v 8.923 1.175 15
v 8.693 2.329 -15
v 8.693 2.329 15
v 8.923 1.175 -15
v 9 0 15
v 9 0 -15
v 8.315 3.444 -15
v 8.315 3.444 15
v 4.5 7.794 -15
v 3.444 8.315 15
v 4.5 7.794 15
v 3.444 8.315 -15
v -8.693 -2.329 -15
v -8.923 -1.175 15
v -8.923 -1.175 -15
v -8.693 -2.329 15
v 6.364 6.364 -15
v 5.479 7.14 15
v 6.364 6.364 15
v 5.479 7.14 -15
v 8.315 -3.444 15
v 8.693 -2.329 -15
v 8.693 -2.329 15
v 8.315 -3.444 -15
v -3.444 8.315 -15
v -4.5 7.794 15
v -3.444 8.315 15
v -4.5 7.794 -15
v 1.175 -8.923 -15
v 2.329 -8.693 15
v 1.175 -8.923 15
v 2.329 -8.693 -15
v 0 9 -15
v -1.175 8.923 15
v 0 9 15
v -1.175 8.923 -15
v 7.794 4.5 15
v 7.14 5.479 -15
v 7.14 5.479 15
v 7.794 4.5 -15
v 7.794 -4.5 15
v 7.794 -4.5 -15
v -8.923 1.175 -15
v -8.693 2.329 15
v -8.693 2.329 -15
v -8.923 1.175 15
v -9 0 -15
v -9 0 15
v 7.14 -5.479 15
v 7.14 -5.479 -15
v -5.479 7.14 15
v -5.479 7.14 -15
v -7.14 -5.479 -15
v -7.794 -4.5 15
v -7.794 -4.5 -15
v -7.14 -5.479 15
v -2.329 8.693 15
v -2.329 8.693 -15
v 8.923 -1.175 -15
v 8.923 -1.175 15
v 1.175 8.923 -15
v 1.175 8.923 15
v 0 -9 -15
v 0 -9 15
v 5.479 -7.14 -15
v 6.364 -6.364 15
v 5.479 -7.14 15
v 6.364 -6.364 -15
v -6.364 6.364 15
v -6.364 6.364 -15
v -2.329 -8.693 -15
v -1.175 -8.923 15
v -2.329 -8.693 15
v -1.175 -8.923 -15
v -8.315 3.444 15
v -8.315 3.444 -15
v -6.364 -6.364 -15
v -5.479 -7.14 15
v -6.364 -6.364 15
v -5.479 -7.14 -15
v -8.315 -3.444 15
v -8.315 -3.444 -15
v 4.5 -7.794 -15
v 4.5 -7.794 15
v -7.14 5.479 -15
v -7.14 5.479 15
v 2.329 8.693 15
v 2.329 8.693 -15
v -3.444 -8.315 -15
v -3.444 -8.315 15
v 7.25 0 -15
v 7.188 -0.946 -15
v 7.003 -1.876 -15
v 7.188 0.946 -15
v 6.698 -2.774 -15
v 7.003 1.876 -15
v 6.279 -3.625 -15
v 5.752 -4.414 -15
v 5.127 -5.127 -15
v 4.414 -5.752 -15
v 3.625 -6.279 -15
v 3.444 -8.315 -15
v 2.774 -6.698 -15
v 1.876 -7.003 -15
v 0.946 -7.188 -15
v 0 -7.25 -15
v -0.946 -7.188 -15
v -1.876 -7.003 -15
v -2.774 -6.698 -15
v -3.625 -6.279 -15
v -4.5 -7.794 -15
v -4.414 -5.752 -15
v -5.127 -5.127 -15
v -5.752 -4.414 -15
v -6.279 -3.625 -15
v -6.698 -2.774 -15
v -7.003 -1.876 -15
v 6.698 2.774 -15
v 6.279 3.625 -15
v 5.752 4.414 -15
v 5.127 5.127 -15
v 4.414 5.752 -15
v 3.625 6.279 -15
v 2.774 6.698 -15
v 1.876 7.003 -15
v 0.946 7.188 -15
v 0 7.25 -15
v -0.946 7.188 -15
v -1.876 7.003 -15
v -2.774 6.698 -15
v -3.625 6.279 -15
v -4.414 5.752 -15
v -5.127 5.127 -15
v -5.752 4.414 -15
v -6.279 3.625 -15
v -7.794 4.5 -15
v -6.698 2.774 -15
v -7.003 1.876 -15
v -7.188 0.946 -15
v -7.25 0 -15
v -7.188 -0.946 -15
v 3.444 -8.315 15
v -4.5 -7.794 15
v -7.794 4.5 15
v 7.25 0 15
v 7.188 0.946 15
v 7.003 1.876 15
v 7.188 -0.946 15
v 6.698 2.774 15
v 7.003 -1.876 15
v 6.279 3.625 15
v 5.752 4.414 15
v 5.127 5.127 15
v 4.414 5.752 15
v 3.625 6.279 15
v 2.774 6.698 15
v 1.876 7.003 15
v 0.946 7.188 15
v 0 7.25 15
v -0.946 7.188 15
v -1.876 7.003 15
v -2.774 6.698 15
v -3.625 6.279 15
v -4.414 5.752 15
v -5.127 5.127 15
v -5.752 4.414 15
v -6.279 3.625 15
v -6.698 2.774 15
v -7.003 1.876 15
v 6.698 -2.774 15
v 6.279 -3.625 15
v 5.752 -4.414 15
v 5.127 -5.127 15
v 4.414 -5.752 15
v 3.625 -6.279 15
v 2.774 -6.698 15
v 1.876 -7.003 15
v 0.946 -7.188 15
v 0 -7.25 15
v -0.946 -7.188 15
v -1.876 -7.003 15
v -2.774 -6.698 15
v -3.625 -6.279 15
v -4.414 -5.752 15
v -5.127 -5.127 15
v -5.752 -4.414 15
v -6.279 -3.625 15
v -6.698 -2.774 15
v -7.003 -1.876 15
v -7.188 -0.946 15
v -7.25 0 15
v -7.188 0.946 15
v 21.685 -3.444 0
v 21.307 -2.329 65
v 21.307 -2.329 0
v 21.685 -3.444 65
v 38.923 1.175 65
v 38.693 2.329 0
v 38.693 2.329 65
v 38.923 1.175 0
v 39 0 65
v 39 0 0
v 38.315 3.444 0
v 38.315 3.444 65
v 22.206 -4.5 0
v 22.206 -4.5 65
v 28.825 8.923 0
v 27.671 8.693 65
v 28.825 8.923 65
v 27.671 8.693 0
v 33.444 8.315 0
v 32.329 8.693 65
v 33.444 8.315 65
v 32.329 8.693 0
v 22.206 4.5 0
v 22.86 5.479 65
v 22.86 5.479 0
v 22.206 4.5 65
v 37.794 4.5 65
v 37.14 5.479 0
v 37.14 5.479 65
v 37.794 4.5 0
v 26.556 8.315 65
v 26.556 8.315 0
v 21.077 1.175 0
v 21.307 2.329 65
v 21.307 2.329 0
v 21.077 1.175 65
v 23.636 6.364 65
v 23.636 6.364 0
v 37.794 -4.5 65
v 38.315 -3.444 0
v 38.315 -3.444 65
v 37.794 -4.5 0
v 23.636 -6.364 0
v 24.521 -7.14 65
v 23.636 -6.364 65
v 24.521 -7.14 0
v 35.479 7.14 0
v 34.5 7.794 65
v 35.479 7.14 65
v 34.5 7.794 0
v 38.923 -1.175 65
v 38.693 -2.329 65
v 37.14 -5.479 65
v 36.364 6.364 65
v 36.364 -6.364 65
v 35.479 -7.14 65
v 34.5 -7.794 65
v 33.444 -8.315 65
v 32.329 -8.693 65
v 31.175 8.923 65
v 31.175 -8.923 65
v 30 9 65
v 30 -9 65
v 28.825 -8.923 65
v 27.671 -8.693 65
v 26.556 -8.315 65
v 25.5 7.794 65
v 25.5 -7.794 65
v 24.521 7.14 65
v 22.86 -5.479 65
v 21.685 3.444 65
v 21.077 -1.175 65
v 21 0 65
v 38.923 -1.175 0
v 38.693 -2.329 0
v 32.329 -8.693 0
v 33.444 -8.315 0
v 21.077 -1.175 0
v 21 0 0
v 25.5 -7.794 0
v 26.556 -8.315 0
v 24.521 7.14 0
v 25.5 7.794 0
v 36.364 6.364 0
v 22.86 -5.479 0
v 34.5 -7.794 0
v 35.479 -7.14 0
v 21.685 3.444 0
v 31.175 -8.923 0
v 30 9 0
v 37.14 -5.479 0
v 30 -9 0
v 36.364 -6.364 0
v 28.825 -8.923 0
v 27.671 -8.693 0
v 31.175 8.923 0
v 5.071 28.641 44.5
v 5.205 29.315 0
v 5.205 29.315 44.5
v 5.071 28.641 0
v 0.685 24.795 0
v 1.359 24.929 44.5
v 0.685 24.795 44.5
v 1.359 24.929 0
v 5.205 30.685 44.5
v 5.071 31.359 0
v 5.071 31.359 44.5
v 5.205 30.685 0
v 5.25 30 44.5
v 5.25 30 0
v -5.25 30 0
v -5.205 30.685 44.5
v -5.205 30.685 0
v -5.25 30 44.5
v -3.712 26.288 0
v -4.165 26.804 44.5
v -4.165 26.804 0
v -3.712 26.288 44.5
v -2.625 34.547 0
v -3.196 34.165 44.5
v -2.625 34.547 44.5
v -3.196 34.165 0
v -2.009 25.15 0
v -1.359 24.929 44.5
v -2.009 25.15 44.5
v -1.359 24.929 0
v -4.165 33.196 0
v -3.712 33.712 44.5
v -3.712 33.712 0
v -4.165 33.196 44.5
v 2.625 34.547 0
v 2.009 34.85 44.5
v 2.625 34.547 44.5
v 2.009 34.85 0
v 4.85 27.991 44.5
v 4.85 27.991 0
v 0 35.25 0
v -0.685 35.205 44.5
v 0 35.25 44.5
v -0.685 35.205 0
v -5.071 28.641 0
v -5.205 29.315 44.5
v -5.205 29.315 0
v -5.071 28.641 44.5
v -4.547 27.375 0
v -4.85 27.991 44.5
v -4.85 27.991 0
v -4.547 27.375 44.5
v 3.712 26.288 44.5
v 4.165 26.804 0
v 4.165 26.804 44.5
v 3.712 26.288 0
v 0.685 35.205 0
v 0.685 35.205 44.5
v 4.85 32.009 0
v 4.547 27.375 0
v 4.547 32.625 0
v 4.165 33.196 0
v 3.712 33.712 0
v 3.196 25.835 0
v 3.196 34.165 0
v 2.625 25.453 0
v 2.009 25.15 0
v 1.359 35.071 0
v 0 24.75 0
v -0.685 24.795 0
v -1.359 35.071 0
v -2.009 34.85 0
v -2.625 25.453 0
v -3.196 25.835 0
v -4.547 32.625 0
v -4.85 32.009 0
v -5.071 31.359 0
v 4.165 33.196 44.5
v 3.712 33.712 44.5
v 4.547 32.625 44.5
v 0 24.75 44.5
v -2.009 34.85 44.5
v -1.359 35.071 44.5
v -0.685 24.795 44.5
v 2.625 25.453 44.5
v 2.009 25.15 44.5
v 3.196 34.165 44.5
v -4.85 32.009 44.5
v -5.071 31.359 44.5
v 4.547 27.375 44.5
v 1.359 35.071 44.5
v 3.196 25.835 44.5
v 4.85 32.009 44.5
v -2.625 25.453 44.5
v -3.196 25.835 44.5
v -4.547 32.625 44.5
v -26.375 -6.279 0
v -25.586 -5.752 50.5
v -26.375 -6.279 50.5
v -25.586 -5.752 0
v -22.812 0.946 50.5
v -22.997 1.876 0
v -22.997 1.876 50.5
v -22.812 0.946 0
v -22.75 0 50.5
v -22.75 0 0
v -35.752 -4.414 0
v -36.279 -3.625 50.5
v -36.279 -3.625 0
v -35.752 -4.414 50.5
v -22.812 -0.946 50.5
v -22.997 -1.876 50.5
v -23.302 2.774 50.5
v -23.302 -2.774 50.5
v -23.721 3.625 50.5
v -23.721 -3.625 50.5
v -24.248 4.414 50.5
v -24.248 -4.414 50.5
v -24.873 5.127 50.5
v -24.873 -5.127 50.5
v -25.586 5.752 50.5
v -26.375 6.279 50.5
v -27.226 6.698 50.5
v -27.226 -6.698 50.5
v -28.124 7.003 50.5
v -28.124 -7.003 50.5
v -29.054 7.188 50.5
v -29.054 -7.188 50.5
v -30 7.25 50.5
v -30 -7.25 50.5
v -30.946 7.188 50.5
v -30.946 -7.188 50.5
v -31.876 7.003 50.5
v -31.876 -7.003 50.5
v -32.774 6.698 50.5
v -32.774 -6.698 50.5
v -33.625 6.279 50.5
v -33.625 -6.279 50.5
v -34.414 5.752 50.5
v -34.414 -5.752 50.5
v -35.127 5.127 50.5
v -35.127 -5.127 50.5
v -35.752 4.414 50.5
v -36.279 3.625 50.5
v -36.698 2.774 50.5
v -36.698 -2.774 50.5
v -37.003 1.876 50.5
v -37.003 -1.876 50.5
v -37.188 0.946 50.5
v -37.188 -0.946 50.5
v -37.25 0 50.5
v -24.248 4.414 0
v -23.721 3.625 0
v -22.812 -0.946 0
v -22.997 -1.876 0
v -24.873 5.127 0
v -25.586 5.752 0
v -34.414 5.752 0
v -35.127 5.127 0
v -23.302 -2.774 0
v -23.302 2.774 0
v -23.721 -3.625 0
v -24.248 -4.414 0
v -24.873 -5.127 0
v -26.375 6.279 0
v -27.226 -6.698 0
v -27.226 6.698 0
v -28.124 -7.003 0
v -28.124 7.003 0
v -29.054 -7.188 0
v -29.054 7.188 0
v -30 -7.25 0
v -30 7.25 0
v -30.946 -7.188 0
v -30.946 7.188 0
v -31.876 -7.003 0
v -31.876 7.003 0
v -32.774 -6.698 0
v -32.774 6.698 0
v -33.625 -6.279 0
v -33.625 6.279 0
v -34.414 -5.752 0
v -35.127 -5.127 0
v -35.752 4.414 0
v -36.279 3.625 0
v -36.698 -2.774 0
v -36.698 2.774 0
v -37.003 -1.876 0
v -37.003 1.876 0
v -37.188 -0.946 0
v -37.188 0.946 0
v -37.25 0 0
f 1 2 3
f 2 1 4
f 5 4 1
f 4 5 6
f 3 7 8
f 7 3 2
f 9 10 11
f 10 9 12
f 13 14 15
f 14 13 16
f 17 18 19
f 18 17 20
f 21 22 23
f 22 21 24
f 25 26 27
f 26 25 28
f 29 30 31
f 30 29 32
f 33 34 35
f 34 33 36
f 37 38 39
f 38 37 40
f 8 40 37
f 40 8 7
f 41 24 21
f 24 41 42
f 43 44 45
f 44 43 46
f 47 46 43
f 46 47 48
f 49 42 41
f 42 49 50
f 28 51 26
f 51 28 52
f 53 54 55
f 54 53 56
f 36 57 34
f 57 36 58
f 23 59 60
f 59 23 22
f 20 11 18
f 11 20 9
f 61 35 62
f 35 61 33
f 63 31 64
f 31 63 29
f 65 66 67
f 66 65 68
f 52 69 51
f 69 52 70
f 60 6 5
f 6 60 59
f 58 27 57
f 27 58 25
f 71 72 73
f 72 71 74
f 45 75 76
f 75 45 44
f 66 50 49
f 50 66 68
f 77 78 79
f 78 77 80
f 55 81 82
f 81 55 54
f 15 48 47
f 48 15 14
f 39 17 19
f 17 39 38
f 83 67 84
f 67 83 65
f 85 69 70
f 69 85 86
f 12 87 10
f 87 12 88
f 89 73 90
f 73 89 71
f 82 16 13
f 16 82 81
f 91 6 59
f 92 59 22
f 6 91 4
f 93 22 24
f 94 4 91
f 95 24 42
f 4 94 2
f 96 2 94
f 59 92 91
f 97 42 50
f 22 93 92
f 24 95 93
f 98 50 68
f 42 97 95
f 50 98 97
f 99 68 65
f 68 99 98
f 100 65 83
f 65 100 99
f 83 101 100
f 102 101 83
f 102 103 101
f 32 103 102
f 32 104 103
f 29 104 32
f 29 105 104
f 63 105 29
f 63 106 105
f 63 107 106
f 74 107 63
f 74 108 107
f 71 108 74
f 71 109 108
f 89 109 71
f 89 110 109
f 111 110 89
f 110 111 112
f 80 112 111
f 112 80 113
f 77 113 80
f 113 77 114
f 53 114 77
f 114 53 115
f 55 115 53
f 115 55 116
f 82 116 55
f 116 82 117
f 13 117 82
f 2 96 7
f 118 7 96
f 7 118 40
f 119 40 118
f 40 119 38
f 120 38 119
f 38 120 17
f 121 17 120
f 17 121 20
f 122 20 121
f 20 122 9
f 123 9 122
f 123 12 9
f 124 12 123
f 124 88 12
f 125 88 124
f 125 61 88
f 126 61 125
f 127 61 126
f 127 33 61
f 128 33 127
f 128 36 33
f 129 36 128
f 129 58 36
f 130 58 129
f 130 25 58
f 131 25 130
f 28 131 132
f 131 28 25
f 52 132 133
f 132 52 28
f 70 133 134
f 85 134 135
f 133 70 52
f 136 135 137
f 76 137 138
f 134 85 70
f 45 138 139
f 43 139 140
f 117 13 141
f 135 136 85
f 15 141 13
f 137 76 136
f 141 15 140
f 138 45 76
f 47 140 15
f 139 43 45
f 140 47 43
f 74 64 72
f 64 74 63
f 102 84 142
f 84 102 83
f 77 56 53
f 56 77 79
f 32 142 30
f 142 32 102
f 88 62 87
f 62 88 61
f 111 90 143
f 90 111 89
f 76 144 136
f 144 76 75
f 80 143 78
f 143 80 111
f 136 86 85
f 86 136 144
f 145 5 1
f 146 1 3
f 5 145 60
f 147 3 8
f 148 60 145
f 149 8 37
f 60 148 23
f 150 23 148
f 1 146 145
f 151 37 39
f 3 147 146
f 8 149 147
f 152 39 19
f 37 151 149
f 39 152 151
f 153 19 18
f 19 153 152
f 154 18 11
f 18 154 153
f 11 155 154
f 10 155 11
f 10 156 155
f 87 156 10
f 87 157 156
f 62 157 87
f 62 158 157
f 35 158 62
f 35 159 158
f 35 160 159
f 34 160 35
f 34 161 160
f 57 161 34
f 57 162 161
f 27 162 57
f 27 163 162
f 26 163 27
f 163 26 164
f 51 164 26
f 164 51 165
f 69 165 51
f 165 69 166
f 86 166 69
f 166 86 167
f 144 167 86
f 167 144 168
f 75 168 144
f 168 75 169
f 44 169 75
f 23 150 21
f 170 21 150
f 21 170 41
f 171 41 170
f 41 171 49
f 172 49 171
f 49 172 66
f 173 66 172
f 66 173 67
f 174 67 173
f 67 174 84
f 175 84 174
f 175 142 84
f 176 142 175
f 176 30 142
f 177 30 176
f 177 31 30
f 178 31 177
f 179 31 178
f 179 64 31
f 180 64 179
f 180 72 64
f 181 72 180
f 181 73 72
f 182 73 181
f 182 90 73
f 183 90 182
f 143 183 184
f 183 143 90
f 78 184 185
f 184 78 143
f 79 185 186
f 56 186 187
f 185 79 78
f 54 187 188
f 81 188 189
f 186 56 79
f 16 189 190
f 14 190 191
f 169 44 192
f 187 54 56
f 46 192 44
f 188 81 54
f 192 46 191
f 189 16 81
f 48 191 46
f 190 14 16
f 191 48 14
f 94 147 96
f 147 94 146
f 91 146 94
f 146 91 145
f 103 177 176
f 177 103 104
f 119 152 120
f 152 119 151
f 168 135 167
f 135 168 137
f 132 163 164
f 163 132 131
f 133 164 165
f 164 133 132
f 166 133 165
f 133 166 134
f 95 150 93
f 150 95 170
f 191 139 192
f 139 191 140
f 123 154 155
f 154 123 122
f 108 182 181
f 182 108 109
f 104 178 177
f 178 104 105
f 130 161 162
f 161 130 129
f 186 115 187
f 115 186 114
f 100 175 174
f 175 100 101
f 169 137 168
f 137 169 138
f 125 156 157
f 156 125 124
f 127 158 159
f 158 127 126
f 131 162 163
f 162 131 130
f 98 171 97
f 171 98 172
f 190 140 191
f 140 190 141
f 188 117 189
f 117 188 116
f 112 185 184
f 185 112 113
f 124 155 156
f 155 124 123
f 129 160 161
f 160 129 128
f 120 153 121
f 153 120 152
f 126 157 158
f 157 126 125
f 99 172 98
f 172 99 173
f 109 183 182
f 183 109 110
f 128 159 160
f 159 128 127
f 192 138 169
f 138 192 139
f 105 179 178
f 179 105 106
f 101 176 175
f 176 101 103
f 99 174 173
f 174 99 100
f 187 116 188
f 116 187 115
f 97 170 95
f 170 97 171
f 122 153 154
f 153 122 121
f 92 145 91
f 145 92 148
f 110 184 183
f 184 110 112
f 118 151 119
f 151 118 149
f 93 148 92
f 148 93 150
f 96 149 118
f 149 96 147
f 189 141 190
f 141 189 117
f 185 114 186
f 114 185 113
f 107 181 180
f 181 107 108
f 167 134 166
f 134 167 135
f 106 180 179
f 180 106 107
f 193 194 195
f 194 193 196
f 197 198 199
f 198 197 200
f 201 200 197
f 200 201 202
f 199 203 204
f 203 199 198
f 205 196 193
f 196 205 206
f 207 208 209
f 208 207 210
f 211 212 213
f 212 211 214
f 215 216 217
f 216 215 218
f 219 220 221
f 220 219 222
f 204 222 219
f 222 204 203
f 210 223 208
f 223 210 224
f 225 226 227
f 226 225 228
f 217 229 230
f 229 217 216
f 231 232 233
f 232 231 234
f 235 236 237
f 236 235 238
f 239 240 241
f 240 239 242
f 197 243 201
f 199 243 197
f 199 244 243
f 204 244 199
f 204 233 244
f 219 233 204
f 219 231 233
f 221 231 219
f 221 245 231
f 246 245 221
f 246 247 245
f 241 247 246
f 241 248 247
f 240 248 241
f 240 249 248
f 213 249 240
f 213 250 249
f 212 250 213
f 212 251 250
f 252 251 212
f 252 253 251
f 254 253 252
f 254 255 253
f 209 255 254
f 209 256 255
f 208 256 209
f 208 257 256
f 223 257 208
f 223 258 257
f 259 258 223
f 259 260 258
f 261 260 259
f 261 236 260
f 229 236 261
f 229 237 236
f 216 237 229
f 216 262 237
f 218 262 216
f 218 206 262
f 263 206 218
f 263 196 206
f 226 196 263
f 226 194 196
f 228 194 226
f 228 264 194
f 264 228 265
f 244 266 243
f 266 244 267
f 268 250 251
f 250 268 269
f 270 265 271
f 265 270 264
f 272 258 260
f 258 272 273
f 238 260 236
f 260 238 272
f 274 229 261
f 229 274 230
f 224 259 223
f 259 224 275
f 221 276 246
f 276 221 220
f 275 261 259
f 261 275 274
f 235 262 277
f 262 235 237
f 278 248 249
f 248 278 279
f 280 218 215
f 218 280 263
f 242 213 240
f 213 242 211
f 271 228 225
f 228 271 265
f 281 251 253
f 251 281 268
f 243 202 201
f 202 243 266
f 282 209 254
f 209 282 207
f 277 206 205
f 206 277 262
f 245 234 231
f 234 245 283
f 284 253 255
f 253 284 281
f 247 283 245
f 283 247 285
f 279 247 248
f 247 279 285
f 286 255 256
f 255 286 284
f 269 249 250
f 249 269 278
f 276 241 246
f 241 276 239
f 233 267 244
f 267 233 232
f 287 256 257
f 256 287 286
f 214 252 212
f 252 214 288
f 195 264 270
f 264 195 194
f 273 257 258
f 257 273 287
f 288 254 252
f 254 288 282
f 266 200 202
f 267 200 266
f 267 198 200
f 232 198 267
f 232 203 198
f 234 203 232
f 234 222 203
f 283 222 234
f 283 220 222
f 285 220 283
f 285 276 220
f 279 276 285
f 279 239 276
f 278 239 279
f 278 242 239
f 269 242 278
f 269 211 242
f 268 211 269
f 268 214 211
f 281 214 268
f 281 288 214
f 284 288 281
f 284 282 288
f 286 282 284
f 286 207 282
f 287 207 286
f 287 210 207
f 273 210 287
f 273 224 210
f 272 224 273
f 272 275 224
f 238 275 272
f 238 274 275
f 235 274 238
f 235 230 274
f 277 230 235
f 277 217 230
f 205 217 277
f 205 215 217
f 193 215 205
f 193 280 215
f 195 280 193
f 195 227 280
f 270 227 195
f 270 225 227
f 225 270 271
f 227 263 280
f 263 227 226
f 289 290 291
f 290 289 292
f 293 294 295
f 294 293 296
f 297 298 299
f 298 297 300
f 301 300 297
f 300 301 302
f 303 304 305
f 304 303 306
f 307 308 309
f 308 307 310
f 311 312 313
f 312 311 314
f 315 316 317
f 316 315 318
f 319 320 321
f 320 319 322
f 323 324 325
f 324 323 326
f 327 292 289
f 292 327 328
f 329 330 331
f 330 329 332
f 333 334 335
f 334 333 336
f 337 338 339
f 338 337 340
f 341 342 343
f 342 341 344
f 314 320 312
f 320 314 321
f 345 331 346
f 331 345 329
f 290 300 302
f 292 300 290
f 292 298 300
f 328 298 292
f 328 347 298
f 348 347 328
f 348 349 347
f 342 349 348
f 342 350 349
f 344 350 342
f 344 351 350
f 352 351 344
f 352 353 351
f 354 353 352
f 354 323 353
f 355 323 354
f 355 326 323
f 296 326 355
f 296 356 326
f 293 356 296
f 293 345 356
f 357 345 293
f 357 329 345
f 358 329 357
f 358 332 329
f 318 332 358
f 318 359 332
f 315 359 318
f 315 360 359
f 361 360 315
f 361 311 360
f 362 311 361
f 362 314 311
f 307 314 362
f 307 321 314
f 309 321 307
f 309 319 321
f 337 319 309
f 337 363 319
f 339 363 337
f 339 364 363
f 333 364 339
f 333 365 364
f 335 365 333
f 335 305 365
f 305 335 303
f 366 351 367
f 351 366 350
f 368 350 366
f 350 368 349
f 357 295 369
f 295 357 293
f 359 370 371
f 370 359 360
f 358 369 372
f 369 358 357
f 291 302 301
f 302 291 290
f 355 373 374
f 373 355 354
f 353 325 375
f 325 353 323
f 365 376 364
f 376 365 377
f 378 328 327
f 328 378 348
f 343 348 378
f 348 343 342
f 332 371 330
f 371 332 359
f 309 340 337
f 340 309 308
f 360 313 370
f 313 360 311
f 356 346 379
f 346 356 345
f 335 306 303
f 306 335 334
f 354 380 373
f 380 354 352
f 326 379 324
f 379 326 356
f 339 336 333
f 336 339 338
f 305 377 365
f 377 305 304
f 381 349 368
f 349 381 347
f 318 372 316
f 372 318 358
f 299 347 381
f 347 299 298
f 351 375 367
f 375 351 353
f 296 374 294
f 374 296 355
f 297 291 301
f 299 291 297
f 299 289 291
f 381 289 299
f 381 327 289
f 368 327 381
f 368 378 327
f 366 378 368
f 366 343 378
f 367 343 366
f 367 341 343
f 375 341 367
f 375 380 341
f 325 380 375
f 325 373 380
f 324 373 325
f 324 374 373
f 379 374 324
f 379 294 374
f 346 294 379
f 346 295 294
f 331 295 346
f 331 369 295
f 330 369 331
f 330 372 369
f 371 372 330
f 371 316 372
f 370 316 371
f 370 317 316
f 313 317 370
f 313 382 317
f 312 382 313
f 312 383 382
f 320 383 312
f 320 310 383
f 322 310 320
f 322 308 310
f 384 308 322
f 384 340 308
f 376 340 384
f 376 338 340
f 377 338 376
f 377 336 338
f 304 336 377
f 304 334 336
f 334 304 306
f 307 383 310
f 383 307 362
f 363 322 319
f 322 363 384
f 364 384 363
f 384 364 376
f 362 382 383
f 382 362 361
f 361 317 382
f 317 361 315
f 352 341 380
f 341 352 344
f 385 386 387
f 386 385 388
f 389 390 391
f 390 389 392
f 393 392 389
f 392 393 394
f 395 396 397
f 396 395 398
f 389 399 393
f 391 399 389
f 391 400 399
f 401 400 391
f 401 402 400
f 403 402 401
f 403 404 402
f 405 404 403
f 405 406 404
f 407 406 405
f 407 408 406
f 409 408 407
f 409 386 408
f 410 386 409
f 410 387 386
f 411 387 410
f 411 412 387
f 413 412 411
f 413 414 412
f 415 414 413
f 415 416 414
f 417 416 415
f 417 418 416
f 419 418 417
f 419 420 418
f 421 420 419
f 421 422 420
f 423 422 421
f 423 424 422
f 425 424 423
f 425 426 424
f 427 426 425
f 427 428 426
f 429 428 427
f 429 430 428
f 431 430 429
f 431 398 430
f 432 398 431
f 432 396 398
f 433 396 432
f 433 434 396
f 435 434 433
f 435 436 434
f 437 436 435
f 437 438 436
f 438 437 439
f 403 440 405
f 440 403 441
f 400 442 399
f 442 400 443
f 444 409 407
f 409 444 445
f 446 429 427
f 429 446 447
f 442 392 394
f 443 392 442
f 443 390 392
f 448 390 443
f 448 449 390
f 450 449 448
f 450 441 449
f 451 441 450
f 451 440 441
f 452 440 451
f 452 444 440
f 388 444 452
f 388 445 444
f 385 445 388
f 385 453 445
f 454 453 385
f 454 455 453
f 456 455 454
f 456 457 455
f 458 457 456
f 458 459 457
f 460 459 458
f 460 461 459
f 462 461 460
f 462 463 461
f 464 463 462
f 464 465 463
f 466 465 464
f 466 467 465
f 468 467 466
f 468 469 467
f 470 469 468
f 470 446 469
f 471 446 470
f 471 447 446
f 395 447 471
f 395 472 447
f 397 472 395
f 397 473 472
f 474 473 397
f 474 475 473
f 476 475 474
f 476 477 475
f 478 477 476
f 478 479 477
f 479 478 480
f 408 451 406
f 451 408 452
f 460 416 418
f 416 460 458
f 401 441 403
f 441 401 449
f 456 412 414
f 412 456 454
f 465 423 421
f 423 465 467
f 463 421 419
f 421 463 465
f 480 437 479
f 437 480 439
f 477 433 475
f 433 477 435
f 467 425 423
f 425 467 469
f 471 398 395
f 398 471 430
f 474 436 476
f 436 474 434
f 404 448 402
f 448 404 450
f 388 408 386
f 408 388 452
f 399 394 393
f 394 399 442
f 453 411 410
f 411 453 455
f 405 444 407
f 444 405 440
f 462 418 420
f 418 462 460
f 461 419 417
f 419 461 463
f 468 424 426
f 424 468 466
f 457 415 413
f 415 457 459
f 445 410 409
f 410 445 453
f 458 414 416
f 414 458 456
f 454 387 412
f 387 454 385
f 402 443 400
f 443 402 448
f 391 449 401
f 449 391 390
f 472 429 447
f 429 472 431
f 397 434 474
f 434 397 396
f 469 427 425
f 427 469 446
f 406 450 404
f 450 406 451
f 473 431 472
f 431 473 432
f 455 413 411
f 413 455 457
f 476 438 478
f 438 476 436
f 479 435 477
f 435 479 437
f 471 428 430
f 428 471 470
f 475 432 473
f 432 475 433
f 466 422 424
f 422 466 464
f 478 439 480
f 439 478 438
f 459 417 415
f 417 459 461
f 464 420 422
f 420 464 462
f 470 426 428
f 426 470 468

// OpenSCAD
module bat(r, h) {
	cylinder(r=r, h=h, $fn=48);
}

bat_18650_d = 18;
bat_18650_h = 65;

module bat_18650() {
	bat(r=bat_18650_d/2, h=bat_18650_h);
}

bat_aaa_d = 10.5;
bat_aaa_h = 44.5;

module bat_aaa() {
	bat(r=bat_aaa_d/2, h=bat_aaa_h);
}

bat_aa_d = 14.5;
bat_aa_h = 50.5;

module bat_aa() {
	bat(r=bat_aa_d/2, h=bat_aa_h);
}


bat_c_d = 26.2;
bat_c_h = 50;

module bat_c() {
	bat(r=bat_c_d/2, h=bat_c_h);
}

module bat_adapter() {
	difference() {
		translate([0, 0, -15])
			bat(bat_18650_d/2, 30);
		translate([0, 0, -20])
			bat(bat_aa_d/2, 40);
		# translate([0, 0, -25])
			bat(bat_aaa_d/2, 50);
	}
}

module design() {
	translate([30, 0, 0])
		bat_18650();
	translate([0, 30, 0])
		bat_aaa();
	translate([-30, 0, 0])
		bat_aa();
	// translate([0, -30, 0])
	// 	bat_c();

	bat_adapter();
}

design();
